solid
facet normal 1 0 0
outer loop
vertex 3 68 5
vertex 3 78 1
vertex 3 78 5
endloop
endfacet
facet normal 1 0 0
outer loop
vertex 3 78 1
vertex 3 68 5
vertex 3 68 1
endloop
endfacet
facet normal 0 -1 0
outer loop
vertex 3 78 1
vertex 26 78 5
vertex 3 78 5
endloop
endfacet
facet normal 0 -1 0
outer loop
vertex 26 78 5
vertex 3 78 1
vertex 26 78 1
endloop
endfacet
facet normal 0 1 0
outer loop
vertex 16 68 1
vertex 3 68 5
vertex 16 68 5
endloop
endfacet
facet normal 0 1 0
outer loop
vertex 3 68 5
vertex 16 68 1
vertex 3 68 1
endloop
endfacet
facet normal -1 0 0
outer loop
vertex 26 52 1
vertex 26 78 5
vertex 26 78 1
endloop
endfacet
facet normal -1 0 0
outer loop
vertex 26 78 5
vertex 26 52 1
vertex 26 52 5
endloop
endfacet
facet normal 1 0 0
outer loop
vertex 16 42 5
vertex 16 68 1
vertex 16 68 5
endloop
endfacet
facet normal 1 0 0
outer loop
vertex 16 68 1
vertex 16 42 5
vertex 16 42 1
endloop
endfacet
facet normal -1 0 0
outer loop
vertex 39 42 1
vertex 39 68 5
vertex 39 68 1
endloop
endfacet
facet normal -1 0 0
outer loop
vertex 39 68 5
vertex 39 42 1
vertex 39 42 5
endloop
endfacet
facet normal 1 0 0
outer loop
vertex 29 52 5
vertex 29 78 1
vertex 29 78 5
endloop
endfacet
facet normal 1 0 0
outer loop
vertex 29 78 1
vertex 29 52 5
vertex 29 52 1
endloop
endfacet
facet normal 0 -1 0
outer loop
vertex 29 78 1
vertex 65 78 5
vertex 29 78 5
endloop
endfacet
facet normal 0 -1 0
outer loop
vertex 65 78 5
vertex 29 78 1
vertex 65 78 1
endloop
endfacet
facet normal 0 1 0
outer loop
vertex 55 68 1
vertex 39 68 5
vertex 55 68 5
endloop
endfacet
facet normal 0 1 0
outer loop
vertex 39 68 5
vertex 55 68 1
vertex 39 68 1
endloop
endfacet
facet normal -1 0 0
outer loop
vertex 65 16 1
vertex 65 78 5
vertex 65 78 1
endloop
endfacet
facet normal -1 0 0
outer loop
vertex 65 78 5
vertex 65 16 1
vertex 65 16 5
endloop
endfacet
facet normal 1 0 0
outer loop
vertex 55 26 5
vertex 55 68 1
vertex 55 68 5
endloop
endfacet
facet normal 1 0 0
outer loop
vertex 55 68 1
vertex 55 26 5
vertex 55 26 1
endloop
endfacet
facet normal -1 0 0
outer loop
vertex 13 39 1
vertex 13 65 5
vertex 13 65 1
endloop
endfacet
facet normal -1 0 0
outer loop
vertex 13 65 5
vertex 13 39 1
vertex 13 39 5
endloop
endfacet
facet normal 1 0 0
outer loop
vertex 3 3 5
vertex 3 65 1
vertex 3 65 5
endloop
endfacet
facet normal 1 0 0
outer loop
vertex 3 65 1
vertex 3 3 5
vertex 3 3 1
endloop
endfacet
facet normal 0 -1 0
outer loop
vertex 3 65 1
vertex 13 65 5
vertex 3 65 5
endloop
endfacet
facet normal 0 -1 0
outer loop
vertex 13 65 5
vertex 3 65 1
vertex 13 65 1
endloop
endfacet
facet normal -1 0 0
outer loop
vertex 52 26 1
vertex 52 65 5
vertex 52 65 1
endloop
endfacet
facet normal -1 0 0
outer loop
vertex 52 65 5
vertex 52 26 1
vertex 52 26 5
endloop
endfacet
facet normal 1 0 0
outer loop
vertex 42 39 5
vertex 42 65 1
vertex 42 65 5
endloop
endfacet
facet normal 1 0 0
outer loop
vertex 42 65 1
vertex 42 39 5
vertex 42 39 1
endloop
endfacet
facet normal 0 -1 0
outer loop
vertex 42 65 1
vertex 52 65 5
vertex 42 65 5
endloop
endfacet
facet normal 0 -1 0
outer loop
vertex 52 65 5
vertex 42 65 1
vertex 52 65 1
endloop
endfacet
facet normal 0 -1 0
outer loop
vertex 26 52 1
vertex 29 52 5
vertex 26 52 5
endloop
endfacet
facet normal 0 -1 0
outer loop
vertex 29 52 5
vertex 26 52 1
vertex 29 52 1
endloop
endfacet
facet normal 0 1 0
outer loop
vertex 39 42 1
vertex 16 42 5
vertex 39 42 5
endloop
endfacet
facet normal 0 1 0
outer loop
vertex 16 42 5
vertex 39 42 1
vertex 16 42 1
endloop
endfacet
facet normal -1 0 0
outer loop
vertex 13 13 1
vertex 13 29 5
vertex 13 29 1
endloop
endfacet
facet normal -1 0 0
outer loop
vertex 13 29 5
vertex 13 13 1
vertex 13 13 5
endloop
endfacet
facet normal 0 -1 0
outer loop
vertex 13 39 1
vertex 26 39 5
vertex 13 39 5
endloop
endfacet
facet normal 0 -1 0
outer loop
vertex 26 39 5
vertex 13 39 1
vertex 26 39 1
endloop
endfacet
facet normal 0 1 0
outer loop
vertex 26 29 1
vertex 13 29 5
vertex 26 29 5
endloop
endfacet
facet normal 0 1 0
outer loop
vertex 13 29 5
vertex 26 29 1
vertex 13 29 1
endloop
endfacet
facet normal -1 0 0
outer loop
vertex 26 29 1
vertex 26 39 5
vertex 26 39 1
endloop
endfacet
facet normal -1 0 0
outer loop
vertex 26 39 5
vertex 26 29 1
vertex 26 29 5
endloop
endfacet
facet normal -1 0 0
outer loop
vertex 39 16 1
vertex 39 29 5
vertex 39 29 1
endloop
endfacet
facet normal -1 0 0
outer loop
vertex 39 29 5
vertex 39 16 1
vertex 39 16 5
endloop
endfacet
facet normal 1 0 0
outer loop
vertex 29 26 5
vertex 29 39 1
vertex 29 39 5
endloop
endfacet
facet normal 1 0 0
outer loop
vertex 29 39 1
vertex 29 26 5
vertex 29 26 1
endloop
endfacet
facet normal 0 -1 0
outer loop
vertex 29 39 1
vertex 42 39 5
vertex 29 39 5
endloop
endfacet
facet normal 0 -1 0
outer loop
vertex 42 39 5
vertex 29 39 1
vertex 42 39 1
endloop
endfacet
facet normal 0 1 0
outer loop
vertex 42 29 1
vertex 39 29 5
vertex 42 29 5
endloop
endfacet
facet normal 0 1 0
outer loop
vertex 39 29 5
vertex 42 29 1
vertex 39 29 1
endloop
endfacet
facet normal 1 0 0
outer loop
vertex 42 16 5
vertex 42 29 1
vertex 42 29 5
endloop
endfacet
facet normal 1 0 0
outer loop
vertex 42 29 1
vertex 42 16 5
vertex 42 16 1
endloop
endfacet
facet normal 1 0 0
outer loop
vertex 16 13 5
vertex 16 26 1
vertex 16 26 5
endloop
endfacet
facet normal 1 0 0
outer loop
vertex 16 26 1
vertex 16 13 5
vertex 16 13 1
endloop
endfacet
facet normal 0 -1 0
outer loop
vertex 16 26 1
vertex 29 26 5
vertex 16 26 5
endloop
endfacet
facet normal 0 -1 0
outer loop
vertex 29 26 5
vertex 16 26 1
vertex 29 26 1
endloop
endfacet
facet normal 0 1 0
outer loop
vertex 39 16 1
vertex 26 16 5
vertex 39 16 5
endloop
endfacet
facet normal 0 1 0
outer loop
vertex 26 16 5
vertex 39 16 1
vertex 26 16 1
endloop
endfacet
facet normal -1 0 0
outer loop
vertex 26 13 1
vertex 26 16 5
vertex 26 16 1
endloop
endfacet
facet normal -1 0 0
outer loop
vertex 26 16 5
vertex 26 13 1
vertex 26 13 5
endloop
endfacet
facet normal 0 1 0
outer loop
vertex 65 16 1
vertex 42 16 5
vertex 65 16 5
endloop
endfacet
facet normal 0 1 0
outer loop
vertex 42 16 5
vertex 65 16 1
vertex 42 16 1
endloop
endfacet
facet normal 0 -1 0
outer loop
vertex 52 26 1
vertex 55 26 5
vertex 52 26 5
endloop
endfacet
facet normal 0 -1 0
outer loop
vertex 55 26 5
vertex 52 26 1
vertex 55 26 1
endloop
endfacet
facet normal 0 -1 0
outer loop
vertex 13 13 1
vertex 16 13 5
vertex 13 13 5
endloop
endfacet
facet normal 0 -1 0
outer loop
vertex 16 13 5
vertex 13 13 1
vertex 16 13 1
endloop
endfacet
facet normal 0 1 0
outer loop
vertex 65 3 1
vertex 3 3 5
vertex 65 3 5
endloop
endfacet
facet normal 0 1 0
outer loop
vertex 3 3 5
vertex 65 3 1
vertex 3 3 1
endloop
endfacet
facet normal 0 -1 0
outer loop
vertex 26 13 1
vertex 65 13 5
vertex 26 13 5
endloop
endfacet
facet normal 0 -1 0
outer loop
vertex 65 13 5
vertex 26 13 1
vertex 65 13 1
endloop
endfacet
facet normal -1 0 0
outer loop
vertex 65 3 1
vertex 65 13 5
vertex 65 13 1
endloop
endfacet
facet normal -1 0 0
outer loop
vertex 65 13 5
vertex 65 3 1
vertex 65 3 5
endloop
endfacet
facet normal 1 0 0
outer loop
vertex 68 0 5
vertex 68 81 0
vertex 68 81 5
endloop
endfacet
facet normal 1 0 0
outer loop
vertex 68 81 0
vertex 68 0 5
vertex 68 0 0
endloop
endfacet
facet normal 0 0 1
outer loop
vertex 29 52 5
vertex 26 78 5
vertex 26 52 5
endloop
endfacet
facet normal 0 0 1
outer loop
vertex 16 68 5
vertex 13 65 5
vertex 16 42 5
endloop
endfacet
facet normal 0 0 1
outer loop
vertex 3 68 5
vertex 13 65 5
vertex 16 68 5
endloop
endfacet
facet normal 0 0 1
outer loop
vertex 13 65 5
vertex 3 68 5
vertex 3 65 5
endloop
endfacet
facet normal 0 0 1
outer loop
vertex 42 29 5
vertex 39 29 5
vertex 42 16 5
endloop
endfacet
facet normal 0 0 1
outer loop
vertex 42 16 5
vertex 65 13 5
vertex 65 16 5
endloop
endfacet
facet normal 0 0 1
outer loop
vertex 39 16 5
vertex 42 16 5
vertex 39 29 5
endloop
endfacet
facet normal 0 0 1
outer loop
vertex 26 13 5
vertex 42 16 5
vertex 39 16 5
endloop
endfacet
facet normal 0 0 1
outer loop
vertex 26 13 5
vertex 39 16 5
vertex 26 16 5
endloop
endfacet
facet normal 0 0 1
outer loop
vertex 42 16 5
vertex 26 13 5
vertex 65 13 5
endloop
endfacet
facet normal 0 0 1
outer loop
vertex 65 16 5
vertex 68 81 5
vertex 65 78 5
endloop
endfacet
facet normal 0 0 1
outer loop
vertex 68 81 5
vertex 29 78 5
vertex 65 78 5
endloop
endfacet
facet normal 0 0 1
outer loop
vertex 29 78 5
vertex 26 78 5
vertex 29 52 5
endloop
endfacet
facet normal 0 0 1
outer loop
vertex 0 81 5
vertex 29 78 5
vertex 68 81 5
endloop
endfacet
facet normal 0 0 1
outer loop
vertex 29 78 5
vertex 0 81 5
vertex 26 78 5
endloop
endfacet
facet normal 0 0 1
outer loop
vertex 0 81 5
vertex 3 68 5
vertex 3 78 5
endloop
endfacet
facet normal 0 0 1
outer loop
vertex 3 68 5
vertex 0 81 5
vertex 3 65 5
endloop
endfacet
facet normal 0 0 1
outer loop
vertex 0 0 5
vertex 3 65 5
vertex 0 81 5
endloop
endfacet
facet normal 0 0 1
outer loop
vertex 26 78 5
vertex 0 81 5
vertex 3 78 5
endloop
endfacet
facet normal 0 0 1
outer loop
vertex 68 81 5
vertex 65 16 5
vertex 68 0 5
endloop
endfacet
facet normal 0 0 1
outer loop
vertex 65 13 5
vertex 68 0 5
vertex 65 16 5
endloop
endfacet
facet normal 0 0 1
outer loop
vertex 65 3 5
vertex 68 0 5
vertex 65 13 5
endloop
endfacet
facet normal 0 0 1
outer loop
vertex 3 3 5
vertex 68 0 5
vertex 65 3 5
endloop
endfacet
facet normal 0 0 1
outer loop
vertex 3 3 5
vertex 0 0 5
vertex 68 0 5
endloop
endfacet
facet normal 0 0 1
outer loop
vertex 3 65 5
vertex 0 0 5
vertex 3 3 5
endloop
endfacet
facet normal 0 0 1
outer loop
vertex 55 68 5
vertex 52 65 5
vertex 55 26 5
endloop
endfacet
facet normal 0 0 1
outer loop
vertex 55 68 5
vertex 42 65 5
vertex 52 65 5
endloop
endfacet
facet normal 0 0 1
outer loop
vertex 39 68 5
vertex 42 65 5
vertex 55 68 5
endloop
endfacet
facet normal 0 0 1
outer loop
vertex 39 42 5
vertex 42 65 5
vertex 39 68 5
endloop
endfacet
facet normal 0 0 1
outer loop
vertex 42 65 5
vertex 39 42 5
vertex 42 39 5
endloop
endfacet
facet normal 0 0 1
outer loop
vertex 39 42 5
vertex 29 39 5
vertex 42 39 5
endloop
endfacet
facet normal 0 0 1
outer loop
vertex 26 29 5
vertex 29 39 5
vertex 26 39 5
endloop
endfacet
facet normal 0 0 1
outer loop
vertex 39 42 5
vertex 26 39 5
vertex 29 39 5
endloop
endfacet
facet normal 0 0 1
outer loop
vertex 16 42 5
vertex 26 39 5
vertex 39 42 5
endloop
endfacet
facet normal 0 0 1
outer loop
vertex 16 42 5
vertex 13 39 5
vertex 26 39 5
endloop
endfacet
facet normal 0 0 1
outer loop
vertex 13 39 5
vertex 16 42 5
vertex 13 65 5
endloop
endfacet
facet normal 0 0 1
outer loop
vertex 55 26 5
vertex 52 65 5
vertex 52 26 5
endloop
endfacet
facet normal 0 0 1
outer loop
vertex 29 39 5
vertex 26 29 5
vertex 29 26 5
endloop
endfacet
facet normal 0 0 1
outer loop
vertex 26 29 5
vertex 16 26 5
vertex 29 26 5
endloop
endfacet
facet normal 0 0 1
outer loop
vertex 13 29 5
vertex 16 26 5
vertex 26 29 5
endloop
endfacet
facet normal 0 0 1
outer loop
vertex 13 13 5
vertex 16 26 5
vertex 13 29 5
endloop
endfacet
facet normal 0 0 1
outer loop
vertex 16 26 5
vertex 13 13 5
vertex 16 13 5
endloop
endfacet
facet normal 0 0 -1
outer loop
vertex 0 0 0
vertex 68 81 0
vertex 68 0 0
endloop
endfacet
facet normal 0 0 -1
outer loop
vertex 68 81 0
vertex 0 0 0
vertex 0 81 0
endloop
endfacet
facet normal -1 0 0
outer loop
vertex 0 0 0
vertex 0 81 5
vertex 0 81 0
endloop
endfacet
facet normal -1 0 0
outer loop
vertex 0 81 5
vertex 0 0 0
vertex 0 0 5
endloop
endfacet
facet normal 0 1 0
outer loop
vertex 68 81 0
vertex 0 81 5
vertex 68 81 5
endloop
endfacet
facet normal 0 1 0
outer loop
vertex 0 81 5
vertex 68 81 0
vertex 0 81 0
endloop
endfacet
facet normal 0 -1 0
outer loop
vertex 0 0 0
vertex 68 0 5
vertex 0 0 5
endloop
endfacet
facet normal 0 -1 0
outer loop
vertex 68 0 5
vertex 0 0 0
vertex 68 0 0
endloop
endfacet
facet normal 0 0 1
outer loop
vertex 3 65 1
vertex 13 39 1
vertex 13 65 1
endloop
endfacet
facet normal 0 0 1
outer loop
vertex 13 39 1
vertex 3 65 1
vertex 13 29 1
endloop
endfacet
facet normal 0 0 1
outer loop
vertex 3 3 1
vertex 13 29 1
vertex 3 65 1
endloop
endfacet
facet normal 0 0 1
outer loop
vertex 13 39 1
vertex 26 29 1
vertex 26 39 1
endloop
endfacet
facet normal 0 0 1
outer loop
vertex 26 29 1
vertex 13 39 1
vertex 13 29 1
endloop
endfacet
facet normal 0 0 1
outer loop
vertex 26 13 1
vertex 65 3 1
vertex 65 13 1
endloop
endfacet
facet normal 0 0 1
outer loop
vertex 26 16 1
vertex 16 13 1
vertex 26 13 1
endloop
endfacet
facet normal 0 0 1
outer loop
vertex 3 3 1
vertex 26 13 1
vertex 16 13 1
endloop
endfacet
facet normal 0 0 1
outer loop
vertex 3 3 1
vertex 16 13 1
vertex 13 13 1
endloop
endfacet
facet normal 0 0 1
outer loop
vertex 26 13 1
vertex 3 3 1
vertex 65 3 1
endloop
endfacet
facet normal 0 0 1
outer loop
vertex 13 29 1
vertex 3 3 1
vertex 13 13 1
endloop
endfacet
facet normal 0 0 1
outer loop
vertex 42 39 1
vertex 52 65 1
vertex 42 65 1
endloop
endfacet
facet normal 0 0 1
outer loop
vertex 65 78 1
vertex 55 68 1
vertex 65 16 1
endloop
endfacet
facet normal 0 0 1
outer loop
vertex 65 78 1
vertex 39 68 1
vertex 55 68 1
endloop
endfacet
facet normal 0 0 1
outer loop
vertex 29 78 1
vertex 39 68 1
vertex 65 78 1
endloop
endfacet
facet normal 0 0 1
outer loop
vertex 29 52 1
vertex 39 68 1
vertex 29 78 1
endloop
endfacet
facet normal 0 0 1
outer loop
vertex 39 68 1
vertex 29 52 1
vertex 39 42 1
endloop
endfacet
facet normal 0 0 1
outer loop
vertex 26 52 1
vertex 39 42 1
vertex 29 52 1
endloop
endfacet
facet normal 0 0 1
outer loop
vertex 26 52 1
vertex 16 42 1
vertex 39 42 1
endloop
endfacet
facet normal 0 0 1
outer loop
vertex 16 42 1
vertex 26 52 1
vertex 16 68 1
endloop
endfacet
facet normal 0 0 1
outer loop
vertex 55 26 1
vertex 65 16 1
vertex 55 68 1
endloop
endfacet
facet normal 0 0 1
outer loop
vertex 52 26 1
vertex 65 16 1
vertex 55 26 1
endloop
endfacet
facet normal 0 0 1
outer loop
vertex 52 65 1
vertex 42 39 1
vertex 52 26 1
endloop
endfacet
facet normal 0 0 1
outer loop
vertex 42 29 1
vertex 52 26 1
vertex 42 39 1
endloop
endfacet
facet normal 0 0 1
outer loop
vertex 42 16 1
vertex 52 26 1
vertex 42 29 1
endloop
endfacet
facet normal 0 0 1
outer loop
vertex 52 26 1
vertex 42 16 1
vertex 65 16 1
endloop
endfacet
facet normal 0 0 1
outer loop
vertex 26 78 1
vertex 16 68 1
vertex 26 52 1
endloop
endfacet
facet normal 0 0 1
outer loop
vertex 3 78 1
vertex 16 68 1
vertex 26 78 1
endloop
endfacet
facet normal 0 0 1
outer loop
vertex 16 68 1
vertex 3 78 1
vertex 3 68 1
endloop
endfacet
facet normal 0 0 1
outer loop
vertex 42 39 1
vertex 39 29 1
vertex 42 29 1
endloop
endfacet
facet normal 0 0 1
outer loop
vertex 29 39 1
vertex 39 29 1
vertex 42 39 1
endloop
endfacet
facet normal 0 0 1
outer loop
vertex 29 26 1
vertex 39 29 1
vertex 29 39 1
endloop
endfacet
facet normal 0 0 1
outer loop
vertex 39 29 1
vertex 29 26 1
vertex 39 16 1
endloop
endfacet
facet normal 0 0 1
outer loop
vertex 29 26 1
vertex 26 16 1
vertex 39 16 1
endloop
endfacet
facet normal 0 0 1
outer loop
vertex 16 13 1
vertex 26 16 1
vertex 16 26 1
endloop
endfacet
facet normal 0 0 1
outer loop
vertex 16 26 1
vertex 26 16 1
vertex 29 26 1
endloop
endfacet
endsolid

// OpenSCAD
// file: test/output/maze-data.scad
// code generated maze data
rows = 6;
columns = 5;
connections = [
//  [r,c,S,E]
// S = 0, cut South Wall
// E = 0, cut East Wall
	[0,0,1,0],
	[0,1,0,1],
	[0,2,0,0],
	[0,3,1,0],
	[0,4,0,1],
	[1,0,0,1],
	[1,1,0,1],
	[1,2,0,1],
	[1,3,0,1],
	[1,4,0,1],
	[2,0,0,1],
	[2,1,1,0],
	[2,2,1,1],
	[2,3,0,1],
	[2,4,0,1],
	[3,0,0,0],
	[3,1,1,1],
	[3,2,0,0],
	[3,3,0,1],
	[3,4,0,1],
	[4,0,0,1],
	[4,1,0,0],
	[4,2,1,1],
	[4,3,1,0],
	[4,4,1,1],
	[5,0,1,0],
	[5,1,1,0],
	[5,2,1,0],
	[5,3,1,0],
	[5,4,1,1]
];
// main file
// Author: Mitch Allen
// File: maze.scad

include <test/output/maze-data.scad>

cellSize = 10;
wallSize = 3;
wallCutPadding = 1; // so sliver not left behind when wall cut out
panelSize = cellSize + wallSize;

mazePanelWidth = columns * panelSize + wallSize;
mazePanelHeight = rows * panelSize + wallSize;
mazePanelThickness = 5;
mazeFloorThickness = 1;
// Wall height needs to be large enough to not leave sliver 
// at bottom when cut out
wallHeight = mazePanelThickness * 2;
// Put 25% below zero so it completely goes through panel bottom
wallHeightOffset = 0 - wallHeight / 4;

floorColor = [0,1,0];
wallColor = [0,0,0];

module drawMazePanel() {
    color(wallColor) 
        cube(size = [mazePanelWidth,mazePanelHeight,mazePanelThickness]);
}

module drawMazeFloor() {
    color(floorColor) 
        cube(size = [mazePanelWidth,mazePanelHeight,mazeFloorThickness]);
}

module cutWalls() {
    // subtract cube cells
    for(el = [0:len(connections)-1]) {
        cell = connections[el];
        echo("CELL: ", cell);
        x = cell[0];
        y = cell[1];
        southWall = cell[2];
        eastWall = cell[3];
        
        cx = mazePanelHeight - (panelSize * (x+1));
        cy = wallSize + panelSize * y;
        
        tx = [ cy, cx, wallHeightOffset ];
        translate( tx ) cube( size = [cellSize, cellSize, wallHeight] );
        
        if( southWall == 0) {
            
            // cut south wall
            
            tx = [
                cy, 
                cx - wallCutPadding * 4, 
                wallHeightOffset ];
            
            translate( tx ) cube( size = [
                cellSize, wallSize + wallCutPadding * 2, wallHeight] );
        }
       
        if( eastWall == 0 ) {
            
            // cut east wall
            
            tx = [
                cy + cellSize  - wallCutPadding, 
                cx, 
                wallHeightOffset ];

            translate( tx ) cube( size = [
                wallSize + wallCutPadding * 2, cellSize, wallHeight] );
        }
    }
}

module main() {
    union() {
        difference() {
            drawMazePanel();
            cutWalls();
        }
        drawMazeFloor();
    }
}

main();
